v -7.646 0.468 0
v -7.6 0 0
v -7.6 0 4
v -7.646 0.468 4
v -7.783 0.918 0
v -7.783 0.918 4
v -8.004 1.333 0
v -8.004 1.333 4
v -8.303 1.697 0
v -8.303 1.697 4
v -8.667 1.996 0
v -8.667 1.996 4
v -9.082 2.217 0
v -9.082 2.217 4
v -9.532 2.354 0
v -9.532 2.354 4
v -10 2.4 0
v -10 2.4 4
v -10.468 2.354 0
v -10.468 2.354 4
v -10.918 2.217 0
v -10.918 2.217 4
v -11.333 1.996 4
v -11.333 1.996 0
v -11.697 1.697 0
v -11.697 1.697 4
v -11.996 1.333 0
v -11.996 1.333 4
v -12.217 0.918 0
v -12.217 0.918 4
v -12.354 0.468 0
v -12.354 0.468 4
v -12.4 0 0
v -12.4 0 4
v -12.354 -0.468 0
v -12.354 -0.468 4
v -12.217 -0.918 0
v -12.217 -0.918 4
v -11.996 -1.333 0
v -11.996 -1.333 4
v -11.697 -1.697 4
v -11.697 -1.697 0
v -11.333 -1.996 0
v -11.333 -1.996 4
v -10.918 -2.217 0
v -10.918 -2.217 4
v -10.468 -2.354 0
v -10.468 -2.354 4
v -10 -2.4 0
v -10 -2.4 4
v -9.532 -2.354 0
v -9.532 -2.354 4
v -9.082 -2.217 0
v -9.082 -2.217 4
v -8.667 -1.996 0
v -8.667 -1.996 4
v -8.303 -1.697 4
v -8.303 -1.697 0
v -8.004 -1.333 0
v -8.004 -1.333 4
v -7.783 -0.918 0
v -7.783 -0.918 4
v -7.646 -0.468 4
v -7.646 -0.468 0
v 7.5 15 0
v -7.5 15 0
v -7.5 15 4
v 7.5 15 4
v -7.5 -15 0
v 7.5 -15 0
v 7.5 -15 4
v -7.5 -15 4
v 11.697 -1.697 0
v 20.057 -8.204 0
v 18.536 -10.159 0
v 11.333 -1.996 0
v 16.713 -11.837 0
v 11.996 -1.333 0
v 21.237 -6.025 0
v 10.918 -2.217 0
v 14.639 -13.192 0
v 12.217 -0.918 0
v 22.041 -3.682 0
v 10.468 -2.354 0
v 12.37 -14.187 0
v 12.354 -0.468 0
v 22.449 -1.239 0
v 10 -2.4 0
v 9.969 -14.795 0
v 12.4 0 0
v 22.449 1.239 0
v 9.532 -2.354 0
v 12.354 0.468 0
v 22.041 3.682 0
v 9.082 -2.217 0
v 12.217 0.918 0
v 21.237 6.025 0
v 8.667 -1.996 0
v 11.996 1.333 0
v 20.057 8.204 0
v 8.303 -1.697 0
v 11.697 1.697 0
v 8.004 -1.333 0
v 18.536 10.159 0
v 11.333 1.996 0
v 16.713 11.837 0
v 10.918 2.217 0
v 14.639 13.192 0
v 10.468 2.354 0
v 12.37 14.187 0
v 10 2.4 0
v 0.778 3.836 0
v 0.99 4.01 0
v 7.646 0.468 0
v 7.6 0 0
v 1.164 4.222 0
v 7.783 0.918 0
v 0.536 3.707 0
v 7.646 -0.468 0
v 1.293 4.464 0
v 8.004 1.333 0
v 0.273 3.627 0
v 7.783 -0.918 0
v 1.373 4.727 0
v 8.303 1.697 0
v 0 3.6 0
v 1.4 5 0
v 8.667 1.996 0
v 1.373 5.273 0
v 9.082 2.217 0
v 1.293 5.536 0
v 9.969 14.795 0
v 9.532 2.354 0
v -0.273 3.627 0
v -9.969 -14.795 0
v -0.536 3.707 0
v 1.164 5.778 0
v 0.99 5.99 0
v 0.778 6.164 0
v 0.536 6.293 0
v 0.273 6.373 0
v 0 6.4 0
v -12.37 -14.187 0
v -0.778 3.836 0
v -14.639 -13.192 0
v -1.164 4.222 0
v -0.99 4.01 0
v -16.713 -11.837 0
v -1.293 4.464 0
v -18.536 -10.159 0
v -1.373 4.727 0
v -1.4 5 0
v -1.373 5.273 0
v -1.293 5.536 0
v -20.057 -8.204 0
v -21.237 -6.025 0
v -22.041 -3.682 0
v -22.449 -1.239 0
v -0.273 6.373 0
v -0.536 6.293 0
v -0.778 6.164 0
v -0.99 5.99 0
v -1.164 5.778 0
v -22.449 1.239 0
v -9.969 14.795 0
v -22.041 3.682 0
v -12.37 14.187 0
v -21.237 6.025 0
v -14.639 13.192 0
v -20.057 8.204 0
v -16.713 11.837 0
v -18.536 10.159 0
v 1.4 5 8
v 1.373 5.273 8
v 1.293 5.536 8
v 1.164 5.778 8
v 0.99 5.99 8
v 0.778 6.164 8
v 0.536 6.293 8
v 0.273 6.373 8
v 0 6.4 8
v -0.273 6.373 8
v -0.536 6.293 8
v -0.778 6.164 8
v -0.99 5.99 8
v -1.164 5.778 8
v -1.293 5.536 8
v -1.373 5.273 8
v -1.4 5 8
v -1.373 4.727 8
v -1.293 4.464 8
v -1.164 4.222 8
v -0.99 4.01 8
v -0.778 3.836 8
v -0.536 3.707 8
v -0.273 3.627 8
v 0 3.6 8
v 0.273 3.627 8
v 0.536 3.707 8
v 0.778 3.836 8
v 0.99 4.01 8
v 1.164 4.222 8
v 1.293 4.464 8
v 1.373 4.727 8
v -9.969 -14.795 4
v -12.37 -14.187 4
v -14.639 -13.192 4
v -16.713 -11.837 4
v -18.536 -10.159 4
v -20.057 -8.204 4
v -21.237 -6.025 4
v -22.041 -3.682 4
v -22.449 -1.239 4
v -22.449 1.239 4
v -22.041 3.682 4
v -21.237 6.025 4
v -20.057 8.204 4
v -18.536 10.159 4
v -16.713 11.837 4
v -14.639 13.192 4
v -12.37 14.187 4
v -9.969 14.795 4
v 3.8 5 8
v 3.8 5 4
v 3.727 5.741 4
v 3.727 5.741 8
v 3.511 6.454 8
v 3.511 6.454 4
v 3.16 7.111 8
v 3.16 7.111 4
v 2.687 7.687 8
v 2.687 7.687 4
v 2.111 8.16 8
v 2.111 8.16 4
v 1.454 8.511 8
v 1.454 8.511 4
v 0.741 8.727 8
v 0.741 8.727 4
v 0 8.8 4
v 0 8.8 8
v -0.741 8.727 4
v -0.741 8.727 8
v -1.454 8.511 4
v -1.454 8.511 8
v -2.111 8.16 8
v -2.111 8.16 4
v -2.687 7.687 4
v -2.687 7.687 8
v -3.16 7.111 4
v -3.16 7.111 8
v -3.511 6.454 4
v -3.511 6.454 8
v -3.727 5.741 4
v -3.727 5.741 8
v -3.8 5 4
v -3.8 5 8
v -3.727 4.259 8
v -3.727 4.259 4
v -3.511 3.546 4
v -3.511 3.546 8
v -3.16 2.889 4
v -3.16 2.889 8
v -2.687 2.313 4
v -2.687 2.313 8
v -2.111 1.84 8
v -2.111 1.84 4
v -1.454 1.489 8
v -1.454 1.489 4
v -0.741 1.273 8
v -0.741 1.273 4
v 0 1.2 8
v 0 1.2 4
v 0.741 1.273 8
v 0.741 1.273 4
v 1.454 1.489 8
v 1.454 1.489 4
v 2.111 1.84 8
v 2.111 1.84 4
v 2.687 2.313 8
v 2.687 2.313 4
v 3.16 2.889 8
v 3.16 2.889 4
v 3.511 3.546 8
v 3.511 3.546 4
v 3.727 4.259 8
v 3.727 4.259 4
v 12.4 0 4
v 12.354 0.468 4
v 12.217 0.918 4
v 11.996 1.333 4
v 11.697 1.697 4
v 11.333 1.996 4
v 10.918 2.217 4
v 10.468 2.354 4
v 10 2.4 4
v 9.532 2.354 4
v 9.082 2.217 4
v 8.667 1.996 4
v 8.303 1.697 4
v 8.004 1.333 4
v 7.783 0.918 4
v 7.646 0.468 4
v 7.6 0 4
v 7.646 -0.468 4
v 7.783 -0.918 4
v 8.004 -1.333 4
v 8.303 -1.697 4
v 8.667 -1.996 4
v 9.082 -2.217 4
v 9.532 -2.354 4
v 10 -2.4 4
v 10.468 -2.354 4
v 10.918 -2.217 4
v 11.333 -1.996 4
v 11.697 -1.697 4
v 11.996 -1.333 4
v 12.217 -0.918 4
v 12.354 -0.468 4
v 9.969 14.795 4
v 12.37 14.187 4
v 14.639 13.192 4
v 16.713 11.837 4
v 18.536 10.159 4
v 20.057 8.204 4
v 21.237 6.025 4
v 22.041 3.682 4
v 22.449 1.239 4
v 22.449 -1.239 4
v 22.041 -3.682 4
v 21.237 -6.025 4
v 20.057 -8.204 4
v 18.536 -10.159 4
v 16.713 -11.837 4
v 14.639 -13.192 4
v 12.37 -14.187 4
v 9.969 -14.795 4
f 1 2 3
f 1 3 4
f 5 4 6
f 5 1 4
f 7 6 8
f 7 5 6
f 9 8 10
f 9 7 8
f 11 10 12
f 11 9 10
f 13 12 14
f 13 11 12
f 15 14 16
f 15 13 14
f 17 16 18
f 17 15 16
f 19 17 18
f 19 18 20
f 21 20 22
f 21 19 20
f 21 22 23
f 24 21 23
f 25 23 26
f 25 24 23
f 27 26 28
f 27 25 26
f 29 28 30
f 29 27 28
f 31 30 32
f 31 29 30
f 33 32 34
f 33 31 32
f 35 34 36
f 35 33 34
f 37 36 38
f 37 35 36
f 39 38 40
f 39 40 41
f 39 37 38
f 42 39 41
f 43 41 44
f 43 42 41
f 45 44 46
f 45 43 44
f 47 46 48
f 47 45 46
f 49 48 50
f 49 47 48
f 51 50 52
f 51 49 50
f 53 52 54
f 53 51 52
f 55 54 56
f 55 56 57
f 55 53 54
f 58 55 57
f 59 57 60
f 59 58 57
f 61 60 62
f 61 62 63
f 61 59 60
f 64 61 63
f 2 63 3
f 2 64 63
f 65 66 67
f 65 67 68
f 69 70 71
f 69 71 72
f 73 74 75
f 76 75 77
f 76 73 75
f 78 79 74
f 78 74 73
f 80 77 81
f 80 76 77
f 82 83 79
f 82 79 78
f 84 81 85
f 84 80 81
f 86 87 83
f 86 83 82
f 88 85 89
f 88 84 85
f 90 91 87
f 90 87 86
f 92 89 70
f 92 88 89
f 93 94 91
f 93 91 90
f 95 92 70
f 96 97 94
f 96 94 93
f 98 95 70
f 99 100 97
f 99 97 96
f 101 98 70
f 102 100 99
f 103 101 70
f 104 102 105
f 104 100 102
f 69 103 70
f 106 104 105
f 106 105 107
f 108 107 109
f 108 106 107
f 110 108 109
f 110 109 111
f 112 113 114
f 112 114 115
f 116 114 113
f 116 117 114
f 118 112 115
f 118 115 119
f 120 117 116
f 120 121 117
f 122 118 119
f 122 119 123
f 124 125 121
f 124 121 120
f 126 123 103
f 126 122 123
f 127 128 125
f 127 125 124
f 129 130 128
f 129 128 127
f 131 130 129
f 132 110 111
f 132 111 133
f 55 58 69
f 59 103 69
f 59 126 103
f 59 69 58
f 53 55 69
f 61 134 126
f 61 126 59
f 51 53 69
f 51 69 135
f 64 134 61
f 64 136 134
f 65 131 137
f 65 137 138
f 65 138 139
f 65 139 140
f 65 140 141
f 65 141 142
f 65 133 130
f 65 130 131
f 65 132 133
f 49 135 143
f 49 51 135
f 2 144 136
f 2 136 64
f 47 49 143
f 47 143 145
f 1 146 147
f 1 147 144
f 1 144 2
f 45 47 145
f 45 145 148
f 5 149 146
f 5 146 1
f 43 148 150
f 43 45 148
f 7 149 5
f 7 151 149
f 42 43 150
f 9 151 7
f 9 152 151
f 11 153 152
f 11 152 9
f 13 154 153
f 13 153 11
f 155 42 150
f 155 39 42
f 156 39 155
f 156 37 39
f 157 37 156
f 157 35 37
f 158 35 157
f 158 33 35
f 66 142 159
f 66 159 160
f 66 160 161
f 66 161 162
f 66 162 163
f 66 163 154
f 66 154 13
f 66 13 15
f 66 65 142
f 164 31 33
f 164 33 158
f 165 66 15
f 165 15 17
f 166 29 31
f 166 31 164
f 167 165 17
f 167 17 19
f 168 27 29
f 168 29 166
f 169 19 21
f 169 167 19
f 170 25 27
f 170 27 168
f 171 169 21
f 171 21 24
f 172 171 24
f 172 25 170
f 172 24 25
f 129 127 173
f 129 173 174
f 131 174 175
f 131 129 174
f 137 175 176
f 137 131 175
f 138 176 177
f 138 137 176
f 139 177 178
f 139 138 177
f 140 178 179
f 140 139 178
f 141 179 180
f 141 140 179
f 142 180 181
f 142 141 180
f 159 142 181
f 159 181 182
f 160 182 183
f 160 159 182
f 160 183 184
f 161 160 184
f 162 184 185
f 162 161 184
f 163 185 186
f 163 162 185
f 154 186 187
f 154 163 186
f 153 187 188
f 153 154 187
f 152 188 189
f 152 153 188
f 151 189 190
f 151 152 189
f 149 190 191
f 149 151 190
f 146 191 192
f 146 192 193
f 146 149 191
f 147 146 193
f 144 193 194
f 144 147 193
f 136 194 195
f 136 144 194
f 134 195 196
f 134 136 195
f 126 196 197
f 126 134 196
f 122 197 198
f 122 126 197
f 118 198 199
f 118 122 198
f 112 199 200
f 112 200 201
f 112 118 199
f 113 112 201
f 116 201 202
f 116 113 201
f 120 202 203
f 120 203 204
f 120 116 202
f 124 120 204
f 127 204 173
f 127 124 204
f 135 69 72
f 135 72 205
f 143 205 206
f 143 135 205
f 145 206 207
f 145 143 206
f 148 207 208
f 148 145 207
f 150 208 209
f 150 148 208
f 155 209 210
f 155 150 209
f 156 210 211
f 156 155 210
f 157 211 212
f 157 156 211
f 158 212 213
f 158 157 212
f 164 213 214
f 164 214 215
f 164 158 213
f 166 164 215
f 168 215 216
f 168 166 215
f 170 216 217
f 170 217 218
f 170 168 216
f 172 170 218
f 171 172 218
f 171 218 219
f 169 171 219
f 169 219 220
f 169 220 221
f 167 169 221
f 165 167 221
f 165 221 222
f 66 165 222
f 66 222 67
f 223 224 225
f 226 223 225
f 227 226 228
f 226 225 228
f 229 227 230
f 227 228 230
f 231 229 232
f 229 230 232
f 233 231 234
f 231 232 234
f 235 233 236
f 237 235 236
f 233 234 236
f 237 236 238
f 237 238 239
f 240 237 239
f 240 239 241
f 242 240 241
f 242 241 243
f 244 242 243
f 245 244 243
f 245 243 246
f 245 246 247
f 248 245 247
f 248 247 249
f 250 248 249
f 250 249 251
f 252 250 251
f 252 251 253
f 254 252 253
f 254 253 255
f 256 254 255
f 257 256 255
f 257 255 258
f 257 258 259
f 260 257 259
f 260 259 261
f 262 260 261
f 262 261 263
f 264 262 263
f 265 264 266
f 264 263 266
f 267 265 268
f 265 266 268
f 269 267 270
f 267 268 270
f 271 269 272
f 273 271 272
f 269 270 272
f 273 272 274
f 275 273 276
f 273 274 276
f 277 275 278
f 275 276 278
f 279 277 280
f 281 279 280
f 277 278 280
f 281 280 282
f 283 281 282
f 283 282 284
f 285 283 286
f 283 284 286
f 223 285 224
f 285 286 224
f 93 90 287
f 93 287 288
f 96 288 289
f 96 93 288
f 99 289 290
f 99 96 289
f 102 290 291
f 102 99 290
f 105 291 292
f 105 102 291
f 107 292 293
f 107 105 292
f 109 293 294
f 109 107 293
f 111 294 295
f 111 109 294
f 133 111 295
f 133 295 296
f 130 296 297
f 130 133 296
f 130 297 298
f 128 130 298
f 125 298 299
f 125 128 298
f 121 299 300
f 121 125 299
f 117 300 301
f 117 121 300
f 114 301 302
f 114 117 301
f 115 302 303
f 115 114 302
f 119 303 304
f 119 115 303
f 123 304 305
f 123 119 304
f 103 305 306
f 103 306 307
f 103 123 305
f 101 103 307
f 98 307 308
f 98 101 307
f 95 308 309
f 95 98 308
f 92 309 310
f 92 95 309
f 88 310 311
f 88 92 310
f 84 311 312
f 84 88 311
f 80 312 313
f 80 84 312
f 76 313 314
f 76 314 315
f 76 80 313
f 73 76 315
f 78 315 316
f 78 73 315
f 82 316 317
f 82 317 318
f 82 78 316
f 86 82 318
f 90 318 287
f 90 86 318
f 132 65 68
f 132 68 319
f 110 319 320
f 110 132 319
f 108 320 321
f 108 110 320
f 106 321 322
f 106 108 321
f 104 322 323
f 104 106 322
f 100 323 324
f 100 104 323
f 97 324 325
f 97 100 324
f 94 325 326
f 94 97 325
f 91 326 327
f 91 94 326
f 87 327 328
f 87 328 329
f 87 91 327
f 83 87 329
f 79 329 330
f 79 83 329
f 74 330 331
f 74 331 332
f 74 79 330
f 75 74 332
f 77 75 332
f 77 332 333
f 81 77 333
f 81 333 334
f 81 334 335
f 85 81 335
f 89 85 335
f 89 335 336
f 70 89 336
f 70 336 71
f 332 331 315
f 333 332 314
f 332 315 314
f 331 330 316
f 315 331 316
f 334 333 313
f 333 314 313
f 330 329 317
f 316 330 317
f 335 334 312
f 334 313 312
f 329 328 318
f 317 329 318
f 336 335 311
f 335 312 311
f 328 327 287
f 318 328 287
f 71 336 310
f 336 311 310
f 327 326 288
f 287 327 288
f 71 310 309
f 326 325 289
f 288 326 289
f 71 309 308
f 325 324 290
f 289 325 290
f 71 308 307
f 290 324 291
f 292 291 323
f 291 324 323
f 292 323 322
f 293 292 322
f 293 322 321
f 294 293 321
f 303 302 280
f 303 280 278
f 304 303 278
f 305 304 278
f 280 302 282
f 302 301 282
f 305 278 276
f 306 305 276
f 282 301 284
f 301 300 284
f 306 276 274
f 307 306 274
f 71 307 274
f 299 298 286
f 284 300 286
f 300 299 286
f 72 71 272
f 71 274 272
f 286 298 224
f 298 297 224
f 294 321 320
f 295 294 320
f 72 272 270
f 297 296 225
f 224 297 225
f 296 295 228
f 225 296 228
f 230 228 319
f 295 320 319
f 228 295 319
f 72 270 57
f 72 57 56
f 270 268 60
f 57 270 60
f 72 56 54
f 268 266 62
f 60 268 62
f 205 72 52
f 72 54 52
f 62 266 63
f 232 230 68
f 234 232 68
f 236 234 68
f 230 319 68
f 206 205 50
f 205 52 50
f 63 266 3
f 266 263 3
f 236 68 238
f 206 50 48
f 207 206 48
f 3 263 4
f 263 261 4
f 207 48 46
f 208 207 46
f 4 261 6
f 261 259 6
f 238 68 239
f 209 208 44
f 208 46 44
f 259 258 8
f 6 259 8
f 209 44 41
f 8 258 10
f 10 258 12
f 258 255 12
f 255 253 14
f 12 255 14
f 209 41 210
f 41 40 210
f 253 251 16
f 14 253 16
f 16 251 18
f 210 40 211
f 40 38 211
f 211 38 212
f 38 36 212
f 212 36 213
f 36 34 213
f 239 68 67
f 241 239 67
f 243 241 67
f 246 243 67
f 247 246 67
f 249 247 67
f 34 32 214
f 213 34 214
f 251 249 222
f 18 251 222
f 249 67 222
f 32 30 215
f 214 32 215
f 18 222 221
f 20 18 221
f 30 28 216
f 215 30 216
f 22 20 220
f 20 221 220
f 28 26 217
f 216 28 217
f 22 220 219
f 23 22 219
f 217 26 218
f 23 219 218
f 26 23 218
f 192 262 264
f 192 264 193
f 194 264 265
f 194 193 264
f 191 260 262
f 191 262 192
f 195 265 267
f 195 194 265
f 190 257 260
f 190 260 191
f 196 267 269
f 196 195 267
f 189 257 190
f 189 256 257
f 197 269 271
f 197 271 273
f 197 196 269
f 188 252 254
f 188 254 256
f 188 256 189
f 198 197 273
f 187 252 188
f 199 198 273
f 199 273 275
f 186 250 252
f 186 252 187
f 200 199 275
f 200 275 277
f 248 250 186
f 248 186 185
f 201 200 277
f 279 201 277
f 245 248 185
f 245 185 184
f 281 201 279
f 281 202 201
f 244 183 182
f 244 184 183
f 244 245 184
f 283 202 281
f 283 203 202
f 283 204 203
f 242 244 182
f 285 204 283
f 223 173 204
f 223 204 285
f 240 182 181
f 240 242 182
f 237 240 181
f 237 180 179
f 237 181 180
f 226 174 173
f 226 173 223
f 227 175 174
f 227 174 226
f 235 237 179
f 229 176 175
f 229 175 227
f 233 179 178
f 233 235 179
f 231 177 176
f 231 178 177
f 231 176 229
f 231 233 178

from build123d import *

# Parameters (mm, degrees)
SKETCH_1_R      = 2.4
SKETCH_1_R_2    = 3.8
EXTRUDE_1_DEPTH = 4
SKETCH_1_3_R    = 3.8
SKETCH_1_3_R_2  = 1.4
EXTRUDE_2_DEPTH = 8


with BuildPart() as part:
    # 草图1 → 凸台-拉伸1 (new body)
    with BuildSketch(Plane.XY):
        with BuildLine():
            Line((7.5, 15), (-7.5, 15))
            ThreePointArc((-7.5, 15), (-22.5, 0), (-7.5, -15))
            Line((-7.5, -15), (7.5, -15))
            ThreePointArc((7.5, -15), (22.5, 0), (7.5, 15))
        make_face()
        with Locations((-10, 0)):
            Circle(SKETCH_1_R, mode=Mode.SUBTRACT)
        with Locations((10, 0)):
            Circle(SKETCH_1_R, mode=Mode.SUBTRACT)
        with Locations((0, 5)):
            Circle(SKETCH_1_R_2, mode=Mode.SUBTRACT)
    extrude(amount=EXTRUDE_1_DEPTH)

    # 草图1<3> → 凸台-拉伸2 (add)
    with BuildSketch(Plane.XY):
        with Locations((0, 5)):
            Circle(SKETCH_1_3_R)
        with Locations((0, 5)):
            Circle(SKETCH_1_3_R_2, mode=Mode.SUBTRACT)
    extrude(amount=EXTRUDE_2_DEPTH)


solid = part.part
